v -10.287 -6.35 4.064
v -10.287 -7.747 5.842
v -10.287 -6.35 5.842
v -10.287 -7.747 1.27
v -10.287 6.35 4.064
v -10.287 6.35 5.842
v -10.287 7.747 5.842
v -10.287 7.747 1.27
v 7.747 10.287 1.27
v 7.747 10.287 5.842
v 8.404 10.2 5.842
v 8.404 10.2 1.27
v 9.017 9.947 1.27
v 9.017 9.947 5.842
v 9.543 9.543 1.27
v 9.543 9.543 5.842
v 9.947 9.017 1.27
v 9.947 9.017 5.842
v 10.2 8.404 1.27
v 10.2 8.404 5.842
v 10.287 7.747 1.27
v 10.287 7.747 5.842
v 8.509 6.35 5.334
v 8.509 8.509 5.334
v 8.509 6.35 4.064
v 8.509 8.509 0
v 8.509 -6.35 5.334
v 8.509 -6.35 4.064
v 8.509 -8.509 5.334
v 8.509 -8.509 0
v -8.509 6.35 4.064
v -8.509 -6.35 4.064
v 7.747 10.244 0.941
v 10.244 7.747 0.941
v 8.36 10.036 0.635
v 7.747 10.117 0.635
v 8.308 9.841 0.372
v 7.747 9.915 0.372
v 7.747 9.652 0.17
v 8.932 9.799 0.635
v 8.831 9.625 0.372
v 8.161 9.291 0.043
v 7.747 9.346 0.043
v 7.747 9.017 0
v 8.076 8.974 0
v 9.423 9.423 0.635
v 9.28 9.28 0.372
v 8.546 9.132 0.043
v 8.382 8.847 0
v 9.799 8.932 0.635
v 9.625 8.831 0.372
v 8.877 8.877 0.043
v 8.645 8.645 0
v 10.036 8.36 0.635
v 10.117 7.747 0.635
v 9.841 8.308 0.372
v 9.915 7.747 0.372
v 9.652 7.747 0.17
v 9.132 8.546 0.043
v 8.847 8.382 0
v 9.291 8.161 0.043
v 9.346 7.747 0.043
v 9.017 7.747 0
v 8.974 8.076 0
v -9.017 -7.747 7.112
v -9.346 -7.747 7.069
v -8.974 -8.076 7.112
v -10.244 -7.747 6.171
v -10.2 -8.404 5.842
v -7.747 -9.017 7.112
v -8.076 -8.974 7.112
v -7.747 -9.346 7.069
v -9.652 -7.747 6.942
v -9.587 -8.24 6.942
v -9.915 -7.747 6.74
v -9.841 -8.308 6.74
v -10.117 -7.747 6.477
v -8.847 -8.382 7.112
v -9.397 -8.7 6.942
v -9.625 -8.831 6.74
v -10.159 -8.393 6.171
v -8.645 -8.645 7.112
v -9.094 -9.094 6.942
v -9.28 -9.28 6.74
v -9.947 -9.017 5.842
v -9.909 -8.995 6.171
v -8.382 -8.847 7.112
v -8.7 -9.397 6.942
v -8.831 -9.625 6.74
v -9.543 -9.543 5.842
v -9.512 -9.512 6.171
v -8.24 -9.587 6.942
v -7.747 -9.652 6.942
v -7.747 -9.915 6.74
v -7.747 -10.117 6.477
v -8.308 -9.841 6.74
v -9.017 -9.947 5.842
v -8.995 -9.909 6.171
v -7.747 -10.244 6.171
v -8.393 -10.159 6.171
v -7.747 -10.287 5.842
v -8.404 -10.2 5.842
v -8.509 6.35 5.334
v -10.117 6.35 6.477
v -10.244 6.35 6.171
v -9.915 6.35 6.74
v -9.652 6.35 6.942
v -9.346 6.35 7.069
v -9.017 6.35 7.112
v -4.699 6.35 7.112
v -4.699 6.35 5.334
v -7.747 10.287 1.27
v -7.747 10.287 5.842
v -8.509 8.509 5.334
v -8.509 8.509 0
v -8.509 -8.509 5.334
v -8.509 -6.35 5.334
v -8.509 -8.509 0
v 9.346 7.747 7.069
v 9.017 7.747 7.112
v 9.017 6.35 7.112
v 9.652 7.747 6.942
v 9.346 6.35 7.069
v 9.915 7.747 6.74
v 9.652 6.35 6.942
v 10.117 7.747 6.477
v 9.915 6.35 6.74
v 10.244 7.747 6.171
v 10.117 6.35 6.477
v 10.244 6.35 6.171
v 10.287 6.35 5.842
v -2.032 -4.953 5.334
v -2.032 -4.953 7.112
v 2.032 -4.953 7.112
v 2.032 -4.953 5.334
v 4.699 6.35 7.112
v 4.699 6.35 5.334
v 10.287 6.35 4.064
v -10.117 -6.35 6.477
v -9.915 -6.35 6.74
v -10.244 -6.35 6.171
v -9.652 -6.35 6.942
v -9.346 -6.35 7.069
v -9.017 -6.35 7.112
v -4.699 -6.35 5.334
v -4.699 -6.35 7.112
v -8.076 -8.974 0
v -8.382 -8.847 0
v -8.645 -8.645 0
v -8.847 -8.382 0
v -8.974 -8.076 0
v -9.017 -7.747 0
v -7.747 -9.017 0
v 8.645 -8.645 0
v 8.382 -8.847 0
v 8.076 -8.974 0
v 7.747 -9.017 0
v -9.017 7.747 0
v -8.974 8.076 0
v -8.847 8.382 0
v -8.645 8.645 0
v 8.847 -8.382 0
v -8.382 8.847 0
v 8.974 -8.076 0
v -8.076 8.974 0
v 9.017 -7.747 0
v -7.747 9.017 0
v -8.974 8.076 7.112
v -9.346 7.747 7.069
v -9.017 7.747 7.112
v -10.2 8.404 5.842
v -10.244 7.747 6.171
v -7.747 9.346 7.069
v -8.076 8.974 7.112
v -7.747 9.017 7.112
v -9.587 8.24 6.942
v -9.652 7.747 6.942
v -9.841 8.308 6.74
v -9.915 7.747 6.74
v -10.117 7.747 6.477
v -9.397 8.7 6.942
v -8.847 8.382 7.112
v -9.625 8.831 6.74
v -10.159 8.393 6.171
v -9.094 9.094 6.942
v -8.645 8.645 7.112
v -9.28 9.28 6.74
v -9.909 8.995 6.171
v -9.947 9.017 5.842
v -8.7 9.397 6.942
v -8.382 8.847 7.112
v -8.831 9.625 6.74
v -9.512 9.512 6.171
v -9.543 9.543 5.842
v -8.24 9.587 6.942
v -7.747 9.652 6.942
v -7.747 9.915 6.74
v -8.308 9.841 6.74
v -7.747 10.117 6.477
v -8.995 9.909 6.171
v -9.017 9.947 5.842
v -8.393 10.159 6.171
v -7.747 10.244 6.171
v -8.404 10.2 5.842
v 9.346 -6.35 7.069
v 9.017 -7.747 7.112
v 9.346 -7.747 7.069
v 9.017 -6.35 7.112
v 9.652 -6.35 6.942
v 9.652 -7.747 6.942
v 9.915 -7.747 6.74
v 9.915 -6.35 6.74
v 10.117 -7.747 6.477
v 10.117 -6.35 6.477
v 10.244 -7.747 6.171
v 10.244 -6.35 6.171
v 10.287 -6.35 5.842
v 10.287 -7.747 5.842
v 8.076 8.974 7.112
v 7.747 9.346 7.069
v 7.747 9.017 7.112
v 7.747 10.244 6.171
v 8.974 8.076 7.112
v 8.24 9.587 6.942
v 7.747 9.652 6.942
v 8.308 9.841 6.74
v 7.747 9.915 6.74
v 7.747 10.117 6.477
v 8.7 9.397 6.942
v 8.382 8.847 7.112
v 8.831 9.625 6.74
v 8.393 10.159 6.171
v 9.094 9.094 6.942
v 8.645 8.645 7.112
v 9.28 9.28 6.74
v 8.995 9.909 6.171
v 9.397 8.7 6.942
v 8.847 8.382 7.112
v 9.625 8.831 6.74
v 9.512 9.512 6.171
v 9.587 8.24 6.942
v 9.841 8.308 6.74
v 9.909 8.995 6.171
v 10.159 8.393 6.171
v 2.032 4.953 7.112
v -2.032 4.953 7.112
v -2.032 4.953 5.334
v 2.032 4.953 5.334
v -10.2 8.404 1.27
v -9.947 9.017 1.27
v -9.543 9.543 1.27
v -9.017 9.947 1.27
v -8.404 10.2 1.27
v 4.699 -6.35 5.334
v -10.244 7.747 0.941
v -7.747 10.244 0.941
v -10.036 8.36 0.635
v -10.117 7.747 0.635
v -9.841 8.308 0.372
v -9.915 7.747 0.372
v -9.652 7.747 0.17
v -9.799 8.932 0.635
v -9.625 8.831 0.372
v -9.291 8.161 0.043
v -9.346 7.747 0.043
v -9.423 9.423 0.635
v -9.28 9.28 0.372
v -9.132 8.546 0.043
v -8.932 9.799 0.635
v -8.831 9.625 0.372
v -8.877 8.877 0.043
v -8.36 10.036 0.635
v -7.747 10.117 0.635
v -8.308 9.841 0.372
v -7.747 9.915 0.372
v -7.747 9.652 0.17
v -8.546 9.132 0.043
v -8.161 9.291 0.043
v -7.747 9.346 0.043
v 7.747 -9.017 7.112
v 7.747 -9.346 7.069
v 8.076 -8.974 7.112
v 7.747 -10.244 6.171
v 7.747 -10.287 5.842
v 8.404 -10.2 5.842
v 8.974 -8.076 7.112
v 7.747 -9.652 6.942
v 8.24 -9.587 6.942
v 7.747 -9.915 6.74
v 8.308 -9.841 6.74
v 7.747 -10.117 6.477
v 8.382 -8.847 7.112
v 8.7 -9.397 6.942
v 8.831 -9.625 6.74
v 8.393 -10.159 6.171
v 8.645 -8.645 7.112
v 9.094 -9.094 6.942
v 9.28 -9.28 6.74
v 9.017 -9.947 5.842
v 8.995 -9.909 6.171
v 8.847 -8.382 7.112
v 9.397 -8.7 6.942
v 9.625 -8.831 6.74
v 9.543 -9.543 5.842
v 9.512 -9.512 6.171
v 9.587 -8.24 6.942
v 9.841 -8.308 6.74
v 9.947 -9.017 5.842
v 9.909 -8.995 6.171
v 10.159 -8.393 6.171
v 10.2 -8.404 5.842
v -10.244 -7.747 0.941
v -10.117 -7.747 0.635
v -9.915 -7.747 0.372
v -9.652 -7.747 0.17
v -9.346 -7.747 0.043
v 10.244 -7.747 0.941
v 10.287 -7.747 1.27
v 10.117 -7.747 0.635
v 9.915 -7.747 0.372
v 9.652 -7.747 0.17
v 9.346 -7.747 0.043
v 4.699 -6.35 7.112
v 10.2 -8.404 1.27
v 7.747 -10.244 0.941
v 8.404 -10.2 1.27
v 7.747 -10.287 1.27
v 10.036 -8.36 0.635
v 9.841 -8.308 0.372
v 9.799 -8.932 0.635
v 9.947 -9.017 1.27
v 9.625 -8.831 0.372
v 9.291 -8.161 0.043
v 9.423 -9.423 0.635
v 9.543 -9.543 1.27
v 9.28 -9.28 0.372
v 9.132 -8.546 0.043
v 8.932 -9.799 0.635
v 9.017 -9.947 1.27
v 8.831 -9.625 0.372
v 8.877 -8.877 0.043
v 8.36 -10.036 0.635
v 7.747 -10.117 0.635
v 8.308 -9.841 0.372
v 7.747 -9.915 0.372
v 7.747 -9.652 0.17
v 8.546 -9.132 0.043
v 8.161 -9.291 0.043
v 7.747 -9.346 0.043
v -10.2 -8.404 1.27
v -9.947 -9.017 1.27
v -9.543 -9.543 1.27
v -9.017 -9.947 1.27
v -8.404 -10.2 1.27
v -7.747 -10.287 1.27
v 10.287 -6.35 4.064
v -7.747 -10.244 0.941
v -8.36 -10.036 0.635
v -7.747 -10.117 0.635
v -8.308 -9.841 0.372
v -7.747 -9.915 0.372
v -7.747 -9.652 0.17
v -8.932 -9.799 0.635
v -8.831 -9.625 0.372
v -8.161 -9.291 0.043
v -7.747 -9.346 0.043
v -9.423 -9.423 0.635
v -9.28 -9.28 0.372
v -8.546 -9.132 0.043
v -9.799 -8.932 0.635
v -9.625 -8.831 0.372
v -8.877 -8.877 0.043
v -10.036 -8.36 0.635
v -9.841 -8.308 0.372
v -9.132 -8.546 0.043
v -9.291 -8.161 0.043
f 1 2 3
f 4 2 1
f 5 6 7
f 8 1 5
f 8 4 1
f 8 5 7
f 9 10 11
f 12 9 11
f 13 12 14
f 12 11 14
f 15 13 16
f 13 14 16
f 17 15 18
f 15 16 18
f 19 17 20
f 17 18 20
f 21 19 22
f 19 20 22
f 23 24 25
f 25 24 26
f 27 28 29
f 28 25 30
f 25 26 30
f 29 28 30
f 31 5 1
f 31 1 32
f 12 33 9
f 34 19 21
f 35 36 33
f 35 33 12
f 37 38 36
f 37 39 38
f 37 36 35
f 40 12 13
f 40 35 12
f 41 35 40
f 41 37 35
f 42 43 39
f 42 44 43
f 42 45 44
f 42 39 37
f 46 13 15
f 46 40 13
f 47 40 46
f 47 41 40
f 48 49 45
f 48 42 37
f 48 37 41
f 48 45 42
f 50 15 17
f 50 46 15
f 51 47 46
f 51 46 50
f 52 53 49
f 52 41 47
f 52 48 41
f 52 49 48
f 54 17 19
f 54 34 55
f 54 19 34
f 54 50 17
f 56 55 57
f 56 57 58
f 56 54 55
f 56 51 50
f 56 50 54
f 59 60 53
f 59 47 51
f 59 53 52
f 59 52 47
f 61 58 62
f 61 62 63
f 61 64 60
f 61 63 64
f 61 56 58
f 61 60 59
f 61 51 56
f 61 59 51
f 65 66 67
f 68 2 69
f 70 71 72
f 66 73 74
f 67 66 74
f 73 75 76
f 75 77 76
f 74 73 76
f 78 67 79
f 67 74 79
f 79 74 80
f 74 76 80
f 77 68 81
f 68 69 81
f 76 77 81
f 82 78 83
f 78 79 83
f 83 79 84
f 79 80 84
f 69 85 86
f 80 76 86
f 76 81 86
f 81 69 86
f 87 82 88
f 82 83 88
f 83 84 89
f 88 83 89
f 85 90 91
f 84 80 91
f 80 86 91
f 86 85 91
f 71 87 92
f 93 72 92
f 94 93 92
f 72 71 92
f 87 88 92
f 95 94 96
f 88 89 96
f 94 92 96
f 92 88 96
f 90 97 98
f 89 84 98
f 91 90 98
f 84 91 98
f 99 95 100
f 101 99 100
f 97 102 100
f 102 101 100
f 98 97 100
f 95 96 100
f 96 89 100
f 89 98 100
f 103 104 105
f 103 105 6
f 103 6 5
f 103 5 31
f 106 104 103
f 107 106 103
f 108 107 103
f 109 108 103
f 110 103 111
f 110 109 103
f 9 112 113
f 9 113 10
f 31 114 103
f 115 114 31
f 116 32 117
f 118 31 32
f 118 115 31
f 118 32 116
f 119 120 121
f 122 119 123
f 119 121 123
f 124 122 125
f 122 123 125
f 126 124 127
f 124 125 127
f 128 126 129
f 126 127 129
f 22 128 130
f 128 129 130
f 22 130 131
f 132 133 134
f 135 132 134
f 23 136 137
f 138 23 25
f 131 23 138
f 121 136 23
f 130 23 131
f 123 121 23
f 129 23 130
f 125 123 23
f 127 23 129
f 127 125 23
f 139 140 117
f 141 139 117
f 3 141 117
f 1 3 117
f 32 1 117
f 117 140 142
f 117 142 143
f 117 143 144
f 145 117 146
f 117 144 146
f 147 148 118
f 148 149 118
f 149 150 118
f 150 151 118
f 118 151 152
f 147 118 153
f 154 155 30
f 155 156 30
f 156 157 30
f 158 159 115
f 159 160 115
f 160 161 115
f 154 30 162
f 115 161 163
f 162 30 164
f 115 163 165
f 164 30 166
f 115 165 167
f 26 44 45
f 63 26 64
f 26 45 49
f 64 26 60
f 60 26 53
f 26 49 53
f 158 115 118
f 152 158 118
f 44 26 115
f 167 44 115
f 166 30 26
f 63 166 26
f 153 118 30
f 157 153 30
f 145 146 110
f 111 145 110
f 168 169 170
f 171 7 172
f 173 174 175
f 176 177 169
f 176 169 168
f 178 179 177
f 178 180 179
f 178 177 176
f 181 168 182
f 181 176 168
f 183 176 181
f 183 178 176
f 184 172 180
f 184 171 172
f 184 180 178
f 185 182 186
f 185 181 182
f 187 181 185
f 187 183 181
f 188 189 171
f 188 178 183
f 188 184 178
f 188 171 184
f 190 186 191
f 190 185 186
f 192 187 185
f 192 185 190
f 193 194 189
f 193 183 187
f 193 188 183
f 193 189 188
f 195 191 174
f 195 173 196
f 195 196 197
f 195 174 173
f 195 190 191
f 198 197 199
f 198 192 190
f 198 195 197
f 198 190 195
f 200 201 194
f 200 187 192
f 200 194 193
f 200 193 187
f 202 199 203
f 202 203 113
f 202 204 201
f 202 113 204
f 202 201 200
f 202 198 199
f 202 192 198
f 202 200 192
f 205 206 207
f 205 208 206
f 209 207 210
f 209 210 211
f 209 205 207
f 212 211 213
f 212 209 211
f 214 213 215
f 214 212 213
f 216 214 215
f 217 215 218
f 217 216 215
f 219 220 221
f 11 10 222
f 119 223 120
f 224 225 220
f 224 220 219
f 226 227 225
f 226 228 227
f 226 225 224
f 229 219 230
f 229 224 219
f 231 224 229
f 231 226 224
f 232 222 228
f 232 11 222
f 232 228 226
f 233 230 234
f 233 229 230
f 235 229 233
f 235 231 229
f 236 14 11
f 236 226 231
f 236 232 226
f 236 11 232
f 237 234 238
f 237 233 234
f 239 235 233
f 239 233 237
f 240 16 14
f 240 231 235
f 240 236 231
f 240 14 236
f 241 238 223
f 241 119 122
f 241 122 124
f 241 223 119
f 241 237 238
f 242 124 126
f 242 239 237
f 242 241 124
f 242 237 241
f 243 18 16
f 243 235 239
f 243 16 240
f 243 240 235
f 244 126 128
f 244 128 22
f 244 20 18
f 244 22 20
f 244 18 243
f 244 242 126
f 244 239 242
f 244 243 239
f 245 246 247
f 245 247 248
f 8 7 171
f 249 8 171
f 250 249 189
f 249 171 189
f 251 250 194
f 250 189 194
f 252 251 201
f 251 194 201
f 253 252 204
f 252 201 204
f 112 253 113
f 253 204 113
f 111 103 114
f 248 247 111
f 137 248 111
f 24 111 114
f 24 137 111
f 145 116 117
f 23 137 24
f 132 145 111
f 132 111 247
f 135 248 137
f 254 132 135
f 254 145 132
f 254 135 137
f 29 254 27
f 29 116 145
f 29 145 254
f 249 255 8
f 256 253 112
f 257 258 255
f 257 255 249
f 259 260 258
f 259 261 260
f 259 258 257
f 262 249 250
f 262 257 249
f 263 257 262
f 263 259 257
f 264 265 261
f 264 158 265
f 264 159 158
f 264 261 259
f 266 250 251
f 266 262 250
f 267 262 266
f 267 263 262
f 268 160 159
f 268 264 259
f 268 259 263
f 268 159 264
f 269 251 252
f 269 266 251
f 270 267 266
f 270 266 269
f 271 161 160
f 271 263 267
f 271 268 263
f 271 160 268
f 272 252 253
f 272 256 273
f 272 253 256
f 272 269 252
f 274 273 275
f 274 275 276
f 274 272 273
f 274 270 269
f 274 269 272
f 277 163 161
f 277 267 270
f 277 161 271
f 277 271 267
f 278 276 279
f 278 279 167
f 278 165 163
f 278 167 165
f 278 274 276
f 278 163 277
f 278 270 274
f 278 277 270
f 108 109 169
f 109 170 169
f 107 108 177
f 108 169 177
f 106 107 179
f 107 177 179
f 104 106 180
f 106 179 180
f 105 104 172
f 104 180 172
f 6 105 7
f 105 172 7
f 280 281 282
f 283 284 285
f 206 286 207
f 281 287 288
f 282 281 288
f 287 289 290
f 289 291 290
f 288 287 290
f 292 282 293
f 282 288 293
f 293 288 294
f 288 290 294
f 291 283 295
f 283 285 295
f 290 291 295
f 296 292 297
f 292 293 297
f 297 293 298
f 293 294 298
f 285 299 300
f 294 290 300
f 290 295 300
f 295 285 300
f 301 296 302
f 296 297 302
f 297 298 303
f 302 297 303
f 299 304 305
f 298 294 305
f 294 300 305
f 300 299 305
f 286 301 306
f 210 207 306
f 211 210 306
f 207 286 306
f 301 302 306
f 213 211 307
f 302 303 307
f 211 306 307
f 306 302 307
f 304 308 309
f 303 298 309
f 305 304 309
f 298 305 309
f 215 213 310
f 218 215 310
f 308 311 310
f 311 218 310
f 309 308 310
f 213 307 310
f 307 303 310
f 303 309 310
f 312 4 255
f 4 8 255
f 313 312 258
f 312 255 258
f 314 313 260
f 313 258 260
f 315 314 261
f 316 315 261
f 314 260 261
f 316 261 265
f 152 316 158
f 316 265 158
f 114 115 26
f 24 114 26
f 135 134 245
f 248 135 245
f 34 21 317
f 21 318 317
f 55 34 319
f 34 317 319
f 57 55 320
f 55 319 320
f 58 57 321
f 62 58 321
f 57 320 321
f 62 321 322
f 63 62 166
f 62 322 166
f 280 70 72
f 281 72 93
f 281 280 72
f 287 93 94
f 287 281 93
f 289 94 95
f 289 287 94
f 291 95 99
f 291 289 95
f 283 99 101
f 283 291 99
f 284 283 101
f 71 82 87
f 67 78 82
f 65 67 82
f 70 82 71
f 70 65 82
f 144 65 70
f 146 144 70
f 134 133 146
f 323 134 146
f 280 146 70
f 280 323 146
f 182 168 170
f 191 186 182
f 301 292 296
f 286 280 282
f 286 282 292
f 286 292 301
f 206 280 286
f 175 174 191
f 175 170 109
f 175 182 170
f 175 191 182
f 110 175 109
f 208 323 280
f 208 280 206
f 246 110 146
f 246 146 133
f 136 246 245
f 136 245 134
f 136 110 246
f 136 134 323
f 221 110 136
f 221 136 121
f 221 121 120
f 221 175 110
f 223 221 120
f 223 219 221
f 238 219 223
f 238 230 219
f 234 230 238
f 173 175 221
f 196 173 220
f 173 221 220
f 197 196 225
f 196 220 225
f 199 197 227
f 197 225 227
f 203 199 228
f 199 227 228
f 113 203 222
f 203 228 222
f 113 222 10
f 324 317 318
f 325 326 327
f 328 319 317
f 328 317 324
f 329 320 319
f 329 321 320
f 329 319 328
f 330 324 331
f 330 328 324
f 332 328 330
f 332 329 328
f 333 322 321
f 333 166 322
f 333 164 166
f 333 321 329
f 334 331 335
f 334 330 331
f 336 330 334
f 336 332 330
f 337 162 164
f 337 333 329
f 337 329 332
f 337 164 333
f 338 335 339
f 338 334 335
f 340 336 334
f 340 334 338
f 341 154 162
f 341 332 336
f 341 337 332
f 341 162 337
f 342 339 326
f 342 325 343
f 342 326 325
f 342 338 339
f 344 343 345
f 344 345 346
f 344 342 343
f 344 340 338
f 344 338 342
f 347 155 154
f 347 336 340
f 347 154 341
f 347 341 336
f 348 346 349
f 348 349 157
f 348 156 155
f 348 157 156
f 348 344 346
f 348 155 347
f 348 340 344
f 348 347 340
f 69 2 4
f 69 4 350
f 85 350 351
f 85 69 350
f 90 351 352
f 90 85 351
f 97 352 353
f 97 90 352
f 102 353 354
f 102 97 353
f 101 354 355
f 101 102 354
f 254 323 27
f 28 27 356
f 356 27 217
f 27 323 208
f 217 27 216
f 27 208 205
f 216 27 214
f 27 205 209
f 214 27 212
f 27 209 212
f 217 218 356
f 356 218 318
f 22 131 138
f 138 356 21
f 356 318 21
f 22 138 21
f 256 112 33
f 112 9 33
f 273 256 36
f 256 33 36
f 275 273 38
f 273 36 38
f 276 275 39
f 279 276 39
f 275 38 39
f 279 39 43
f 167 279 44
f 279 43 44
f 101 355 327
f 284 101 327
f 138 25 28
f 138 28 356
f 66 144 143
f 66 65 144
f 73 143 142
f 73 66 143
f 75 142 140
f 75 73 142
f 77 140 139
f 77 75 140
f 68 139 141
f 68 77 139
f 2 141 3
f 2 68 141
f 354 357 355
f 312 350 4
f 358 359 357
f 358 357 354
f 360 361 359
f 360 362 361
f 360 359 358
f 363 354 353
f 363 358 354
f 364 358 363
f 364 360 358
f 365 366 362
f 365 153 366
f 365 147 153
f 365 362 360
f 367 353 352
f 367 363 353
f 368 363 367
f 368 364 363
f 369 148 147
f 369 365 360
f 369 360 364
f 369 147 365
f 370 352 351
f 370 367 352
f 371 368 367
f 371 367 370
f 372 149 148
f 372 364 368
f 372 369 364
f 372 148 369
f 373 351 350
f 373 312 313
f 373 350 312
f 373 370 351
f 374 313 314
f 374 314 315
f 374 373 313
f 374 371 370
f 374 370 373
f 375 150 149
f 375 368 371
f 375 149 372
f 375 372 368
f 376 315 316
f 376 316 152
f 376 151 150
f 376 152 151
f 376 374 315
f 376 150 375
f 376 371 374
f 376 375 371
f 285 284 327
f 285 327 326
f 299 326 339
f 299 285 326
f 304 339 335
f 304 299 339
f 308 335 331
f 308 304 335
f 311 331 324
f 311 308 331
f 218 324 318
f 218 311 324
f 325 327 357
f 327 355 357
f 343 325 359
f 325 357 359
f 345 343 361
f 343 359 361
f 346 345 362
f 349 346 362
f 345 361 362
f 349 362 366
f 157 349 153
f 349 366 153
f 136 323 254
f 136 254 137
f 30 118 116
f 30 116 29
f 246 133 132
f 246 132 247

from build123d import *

# Parameters (mm, degrees)
F0_W      = 20.574
F0_H      = 20.574
F1_DEPTH  = 7.112
F2_W      = 17.018
F2_H      = 17.018
F3_DEPTH  = 5.334
F4_R      = 2.54
F5_W      = 5.588
F5_H      = 12.7
F6_DEPTH  = 3.048
F7_W      = 11.176
F7_H      = 12.7
F8_DEPTH  = 3.048
F9_W      = 4.064
F9_H      = 9.906
F10_DEPTH = 1.778
F11_R     = 1.27
F12_R     = 1.27


with BuildPart() as f1:
    # F0 (on Top) → F1 (new body)
    with BuildSketch(Plane.XY):
        Rectangle(F0_W, F0_H)
    extrude(amount=F1_DEPTH)

    # F2 (on face) → F3 (cut)
    with BuildSketch(Plane(origin=(0, 0, 0), x_dir=(1, 0, 0), z_dir=(0, 0, -1))):
        Rectangle(F2_W, F2_H)
    extrude(amount=-F3_DEPTH, mode=Mode.SUBTRACT)

    # F4
    f4_edges = [f1.edges().sort_by_distance(p)[0] for p in [
        (-10.287, -10.287, 3.556),
        (10.287, 10.287, 3.556),
        (10.287, -10.287, 3.556),
        (-10.287, 10.287, 3.556),
    ]]
    fillet(f4_edges, radius=F4_R)

    # F5 (on face) → F6 (cut)
    with BuildSketch(Plane.XY.offset(7.112)):
        with Locations((-7.493, 0)):
            Rectangle(F5_W, F5_H)
    extrude(amount=-F6_DEPTH, mode=Mode.SUBTRACT)

    # F7 (on face) → F8 (cut)
    with BuildSketch(Plane.XY.offset(7.112)):
        with Locations((10.287, 0)):
            Rectangle(F7_W, F7_H)
    extrude(amount=-F8_DEPTH, mode=Mode.SUBTRACT)

    # F9 (on face) → F10 (cut)
    with BuildSketch(Plane.XY.offset(7.112)):
        Rectangle(F9_W, F9_H)
    extrude(amount=-F10_DEPTH, mode=Mode.SUBTRACT)

    # F11
    f11_edges = [f1.edges().sort_by_distance(p)[0] for p in [
        (0, 10.287, 7.112),
        (0, -10.287, 7.112),
    ]]
    fillet(f11_edges, radius=F11_R)

    # F12
    f12_edges = [f1.edges().sort_by_distance(p)[0] for p in [
        (-10.287, 0, 0),
        (0, 10.287, 0),
        (-9.543051, 9.543051, 0),
    ]]
    fillet(f12_edges, radius=F12_R)


solid = f1.part
